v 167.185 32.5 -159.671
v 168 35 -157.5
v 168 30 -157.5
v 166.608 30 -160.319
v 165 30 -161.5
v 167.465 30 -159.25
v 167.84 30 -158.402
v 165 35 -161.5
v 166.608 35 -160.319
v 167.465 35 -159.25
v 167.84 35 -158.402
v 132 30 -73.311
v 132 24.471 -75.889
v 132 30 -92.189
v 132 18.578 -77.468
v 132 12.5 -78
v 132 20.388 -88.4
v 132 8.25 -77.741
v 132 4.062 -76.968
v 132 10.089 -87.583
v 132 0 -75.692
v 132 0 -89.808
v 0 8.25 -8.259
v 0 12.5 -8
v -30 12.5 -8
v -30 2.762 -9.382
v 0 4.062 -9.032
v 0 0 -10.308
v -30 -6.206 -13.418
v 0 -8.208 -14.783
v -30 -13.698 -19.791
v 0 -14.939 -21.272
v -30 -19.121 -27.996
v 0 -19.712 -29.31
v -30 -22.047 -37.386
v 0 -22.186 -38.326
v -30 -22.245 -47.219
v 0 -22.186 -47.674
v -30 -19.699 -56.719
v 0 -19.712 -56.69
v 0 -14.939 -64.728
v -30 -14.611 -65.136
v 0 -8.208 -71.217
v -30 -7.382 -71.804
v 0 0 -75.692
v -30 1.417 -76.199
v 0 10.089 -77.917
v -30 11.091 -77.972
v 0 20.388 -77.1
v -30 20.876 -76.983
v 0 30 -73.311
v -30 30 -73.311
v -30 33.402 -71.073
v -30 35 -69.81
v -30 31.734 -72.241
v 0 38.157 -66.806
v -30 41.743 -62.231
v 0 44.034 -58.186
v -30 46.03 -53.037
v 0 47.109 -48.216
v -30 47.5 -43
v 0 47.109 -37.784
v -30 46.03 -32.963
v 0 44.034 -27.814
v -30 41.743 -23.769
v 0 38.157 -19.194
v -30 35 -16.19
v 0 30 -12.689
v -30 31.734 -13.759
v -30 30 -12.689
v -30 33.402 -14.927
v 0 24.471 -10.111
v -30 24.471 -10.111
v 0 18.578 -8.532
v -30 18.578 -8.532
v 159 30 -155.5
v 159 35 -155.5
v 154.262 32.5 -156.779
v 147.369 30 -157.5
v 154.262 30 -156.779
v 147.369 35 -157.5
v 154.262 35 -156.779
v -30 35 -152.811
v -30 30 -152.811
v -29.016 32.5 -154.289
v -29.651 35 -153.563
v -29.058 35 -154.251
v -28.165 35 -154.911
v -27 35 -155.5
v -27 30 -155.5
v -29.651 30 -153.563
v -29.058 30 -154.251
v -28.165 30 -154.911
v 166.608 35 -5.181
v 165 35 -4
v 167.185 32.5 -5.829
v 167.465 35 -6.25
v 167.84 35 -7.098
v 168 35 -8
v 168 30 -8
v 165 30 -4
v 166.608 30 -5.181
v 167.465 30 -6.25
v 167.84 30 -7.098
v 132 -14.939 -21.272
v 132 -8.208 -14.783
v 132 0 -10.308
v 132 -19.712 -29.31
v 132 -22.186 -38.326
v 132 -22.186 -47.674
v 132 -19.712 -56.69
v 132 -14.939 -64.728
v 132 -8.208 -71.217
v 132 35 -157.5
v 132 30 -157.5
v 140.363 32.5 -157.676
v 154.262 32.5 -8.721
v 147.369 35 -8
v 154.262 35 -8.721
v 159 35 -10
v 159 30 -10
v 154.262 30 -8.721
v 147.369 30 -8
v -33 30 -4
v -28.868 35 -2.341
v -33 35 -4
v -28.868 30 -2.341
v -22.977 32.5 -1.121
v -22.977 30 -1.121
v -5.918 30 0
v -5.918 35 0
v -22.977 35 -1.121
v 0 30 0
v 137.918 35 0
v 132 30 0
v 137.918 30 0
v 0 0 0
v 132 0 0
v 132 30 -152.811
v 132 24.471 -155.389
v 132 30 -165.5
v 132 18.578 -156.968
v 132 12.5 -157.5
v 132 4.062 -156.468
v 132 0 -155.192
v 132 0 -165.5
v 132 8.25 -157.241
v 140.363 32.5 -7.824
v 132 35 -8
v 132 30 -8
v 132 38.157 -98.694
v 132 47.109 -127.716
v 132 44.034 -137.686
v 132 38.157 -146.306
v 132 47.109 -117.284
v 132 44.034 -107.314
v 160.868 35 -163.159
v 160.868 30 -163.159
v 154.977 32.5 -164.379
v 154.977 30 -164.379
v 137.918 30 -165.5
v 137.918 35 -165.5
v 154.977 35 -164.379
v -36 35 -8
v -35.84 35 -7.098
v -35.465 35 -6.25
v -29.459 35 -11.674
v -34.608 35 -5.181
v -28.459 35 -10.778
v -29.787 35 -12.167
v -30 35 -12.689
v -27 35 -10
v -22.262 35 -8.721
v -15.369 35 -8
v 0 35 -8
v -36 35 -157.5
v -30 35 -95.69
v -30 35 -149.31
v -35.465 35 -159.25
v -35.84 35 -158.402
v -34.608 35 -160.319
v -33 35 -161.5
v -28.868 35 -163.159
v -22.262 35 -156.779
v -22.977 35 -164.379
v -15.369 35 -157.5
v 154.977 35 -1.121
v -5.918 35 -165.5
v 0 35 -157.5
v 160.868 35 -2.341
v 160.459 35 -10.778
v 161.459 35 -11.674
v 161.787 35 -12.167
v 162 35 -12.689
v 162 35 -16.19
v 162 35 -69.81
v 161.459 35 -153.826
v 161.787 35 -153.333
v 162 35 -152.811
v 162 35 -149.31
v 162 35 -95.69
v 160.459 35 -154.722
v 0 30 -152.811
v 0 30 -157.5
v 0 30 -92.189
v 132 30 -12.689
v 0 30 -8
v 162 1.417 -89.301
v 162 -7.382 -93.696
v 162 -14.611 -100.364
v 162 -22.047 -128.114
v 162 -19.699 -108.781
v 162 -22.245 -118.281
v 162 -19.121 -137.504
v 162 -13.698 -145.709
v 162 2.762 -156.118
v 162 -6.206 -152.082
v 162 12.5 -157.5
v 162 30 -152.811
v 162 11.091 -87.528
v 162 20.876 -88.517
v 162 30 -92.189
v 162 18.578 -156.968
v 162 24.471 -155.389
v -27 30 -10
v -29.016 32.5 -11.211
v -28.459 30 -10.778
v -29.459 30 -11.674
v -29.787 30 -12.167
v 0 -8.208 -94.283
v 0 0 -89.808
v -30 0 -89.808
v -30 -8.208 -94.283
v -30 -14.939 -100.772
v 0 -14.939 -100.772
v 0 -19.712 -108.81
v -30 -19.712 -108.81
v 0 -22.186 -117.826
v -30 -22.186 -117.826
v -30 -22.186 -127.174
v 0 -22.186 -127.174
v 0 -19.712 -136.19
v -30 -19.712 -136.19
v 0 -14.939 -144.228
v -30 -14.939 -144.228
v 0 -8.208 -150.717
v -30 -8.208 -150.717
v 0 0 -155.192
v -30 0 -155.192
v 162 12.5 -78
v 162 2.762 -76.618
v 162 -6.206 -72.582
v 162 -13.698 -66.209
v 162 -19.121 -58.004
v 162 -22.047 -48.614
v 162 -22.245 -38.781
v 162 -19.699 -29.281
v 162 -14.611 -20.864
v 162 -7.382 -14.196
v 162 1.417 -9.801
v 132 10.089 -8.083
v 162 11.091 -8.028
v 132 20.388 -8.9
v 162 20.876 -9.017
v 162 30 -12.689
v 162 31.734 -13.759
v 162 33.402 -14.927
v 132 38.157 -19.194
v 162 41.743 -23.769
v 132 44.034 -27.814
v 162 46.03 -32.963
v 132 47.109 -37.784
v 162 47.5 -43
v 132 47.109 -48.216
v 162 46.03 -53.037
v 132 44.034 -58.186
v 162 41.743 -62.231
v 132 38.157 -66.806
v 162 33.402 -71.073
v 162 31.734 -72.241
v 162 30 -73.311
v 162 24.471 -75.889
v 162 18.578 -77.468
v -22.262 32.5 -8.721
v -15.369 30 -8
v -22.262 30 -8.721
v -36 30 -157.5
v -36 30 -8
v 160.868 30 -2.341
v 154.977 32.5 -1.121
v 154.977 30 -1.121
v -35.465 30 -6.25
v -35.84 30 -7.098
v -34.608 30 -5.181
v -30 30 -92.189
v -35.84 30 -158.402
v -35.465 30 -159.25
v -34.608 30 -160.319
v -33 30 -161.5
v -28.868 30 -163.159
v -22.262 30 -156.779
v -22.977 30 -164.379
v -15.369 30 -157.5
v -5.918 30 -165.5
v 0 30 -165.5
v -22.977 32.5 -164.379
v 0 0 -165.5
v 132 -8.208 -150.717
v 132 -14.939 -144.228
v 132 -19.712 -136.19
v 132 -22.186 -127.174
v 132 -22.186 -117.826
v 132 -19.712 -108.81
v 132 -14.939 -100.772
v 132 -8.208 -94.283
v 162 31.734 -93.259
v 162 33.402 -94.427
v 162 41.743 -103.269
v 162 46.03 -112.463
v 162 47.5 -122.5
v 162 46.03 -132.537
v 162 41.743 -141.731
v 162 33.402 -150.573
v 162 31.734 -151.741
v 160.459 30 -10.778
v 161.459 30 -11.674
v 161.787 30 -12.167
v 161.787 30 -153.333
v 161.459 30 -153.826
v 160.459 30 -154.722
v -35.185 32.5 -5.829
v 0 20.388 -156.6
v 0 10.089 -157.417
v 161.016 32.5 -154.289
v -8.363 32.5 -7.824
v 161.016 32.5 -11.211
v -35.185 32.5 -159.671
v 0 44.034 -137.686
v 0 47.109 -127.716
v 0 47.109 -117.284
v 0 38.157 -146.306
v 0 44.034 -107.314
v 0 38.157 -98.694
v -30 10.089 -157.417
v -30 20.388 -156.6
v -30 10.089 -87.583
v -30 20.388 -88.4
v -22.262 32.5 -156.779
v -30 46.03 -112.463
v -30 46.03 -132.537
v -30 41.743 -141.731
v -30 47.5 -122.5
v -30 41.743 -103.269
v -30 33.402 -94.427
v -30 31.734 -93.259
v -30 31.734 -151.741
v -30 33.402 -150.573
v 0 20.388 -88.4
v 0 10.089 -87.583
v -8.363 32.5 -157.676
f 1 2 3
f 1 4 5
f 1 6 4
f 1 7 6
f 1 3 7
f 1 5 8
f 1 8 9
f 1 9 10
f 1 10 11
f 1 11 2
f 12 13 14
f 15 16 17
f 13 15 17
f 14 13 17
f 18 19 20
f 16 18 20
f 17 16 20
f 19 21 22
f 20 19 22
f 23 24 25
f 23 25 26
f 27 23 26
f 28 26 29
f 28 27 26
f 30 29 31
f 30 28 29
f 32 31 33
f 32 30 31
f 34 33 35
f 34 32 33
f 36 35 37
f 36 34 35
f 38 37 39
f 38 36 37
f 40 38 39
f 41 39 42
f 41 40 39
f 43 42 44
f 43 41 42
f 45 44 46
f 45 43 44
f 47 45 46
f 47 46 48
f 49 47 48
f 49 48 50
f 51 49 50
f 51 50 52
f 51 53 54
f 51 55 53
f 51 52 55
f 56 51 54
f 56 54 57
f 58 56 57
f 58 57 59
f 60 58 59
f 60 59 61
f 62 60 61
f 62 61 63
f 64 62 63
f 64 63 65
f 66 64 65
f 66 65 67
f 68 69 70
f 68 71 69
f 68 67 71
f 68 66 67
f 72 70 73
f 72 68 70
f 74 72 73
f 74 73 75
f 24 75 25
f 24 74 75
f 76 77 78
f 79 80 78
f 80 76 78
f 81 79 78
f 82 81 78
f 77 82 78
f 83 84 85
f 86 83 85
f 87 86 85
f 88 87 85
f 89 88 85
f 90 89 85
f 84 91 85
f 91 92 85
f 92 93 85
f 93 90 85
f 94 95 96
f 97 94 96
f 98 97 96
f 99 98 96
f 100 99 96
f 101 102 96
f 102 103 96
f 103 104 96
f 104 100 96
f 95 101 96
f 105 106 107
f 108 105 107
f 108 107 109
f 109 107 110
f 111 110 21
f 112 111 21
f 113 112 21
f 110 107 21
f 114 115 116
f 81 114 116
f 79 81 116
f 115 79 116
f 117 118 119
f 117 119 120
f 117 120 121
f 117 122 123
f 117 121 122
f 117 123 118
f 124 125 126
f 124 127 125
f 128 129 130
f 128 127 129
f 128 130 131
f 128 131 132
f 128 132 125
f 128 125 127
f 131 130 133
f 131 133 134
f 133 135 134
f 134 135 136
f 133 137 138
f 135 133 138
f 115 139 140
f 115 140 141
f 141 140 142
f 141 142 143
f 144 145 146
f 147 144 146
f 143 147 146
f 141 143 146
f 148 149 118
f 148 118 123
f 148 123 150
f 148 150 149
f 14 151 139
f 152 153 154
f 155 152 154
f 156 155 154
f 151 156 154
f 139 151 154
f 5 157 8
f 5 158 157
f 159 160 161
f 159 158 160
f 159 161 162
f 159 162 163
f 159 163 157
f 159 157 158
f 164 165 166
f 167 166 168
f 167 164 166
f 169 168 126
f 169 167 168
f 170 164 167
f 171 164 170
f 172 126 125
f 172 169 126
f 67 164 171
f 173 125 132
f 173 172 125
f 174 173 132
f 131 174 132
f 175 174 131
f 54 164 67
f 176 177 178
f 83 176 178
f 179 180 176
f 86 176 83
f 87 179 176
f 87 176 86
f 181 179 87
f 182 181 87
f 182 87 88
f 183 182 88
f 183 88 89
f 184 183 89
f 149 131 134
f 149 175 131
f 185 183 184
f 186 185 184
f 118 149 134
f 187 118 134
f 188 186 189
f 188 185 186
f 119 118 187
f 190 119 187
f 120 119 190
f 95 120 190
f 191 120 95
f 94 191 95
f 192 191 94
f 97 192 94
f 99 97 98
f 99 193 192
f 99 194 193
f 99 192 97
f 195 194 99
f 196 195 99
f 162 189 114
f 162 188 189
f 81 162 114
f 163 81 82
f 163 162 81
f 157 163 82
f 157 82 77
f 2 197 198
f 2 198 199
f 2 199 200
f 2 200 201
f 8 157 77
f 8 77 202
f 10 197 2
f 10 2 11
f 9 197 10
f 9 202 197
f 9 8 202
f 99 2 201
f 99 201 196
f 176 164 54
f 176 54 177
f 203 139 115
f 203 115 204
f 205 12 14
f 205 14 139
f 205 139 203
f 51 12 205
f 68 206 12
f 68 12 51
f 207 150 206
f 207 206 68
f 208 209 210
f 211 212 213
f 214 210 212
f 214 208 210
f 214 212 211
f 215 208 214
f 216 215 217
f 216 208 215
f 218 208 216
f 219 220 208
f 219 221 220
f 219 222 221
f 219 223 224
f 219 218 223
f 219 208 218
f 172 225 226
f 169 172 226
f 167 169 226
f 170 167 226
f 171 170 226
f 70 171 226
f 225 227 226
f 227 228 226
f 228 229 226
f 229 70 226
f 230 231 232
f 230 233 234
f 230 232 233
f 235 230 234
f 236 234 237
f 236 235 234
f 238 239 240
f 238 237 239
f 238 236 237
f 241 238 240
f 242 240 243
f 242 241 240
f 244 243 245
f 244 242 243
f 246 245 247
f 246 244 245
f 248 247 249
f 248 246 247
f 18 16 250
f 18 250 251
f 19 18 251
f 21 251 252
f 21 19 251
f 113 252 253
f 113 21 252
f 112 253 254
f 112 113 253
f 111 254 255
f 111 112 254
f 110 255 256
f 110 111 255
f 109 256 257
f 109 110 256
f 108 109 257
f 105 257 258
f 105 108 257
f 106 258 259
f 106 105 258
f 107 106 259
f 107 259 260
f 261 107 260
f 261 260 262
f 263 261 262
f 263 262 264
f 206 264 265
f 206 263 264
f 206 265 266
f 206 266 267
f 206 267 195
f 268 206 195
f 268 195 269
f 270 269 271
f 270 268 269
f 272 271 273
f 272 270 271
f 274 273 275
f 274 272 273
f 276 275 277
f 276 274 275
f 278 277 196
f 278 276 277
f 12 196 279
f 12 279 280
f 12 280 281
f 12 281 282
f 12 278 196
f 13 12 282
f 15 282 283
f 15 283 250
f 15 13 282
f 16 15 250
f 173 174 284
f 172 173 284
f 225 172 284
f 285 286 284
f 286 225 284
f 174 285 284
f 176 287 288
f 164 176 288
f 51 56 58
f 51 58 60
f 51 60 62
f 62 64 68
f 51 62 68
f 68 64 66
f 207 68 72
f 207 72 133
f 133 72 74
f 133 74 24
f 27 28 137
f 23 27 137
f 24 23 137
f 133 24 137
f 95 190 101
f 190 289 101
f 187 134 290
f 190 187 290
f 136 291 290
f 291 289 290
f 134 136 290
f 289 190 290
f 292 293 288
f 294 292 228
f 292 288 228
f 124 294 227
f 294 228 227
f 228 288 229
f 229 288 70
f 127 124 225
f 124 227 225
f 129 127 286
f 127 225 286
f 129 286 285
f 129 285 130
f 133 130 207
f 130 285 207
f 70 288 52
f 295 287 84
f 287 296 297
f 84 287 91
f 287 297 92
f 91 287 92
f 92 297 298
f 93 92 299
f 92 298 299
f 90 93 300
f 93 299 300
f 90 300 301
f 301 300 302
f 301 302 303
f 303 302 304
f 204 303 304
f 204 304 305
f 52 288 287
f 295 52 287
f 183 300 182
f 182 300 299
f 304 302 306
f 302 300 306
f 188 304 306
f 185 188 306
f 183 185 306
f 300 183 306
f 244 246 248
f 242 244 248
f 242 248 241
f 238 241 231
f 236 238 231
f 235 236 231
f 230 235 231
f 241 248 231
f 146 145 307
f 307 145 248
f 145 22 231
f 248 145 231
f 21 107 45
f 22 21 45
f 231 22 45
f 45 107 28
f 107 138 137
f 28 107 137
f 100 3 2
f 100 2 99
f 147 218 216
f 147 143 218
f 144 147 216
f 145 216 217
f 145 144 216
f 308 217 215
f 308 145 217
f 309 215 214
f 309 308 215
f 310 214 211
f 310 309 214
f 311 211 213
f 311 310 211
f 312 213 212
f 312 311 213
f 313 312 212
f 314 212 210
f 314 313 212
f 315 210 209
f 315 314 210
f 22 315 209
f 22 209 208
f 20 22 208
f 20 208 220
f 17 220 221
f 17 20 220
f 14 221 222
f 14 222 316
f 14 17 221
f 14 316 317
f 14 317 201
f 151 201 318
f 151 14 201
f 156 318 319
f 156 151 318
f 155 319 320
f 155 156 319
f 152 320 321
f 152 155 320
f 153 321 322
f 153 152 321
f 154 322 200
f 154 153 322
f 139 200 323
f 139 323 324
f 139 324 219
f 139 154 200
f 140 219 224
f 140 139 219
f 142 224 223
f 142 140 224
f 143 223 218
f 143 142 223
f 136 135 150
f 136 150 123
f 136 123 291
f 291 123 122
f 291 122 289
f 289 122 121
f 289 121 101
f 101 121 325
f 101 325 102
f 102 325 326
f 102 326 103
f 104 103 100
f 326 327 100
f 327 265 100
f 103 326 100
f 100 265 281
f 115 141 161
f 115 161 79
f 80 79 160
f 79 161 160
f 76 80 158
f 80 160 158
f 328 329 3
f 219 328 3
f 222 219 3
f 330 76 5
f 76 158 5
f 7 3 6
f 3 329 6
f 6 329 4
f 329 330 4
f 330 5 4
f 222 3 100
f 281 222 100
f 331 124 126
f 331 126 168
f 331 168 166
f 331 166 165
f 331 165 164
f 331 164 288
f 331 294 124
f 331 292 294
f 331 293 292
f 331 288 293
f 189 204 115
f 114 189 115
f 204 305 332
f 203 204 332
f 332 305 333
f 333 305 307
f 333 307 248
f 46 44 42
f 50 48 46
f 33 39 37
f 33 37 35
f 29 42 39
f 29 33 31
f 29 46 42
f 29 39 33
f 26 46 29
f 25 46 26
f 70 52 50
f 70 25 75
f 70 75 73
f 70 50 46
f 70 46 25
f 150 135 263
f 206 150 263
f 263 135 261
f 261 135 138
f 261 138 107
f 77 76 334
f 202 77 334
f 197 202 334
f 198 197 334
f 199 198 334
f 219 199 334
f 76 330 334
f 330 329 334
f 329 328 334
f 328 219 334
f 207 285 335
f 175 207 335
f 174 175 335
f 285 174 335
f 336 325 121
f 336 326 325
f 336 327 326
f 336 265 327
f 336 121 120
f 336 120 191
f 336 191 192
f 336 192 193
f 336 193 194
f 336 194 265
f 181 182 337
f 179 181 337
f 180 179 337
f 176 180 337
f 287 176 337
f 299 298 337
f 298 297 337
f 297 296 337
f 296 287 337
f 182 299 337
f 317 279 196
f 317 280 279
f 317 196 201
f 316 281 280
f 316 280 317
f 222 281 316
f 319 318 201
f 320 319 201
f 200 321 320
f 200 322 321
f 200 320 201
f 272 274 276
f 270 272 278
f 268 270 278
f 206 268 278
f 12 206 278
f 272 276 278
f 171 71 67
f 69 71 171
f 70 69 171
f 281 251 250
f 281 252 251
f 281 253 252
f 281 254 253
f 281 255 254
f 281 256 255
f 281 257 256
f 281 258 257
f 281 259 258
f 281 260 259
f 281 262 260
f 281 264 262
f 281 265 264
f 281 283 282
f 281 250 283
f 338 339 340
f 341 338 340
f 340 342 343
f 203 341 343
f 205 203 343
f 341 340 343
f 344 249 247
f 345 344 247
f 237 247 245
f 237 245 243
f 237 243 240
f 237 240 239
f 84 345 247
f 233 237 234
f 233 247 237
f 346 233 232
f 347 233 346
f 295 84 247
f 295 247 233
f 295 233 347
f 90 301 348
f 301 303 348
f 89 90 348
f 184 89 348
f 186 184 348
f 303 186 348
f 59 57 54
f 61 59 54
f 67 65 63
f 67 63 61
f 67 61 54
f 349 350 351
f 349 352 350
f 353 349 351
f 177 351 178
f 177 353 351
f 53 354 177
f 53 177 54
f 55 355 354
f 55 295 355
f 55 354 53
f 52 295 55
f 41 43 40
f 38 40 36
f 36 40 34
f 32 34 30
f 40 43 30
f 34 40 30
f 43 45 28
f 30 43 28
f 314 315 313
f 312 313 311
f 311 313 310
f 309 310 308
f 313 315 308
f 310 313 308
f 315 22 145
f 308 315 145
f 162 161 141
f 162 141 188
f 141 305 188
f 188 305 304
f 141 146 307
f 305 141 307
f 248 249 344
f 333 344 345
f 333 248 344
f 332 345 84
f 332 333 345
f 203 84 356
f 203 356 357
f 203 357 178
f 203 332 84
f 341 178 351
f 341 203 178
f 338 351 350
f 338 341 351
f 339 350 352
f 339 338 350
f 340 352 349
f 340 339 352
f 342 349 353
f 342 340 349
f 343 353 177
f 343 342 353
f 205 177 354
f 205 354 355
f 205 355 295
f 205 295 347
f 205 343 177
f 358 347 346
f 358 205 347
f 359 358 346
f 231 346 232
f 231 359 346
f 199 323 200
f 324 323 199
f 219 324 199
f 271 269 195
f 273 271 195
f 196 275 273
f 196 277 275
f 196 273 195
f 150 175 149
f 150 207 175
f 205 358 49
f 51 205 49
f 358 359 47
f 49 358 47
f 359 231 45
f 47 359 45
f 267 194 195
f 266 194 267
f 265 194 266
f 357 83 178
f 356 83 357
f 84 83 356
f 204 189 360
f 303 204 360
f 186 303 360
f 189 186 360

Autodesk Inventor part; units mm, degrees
ref_plane "YZ Plane" through (0, 0, 0) normal (1, 0, 0) x (0, 1, 0)
ref_plane "XZ Plane" through (0, 0, 0) normal (0, 1, 0) x (-1, 0, 0)
ref_plane "XY Plane" through (0, 0, 0) normal (0, 0, 1) x (1, 0, 0)
sketch "Эскиз1" plane through (0, 0, 0) normal (0, 1, 0) x (-1, 0, 0)
  line L0 (0, 0) -> (-132, 0)
  line L1 (-132, 0) -> (-132, -165.5)
  line L2 (-132, -165.5) -> (0, -165.5)
  line L3 (0, -165.5) -> (0, 0)
  line L4 (0, 0) -> (-132, 0)
  line L5 (-132, 0) -> (-132, -8)
  line L6 (-132, -8) -> (0, -8)
  line L7 (0, -8) -> (0, 0)
  line L8 (0, -165.5) -> (-132, -165.5)
  line L9 (-132, -165.5) -> (-132, -157.5)
  line L10 (-132, -157.5) -> (0, -157.5)
  line L11 (0, -157.5) -> (0, -165.5)
  line L12 (0, 0) -> (0, -43)
  line L13 (0, -43) -> (0, -8)
  line L14 (0, -8) -> (30, -8)
  line L15 (30, -8) -> (30, -78)
  line L16 (30, -78) -> (0, -78)
  line L17 (0, -78) -> (0, -8)
  line L18 (0, -157.5) -> (30, -157.5)
  line L19 (30, -157.5) -> (30, -87.5)
  line L20 (30, -87.5) -> (0, -87.5)
  line L21 (0, -87.5) -> (0, -157.5)
  line L22 (-132, -8) -> (-162, -8)
  line L23 (-162, -8) -> (-162, -78)
  line L24 (-162, -78) -> (-132, -78)
  line L25 (-132, -78) -> (-132, -8)
  line L26 (-132, -157.5) -> (-162, -157.5)
  line L27 (-162, -157.5) -> (-162, -87.5)
  line L28 (-162, -87.5) -> (-132, -87.5)
  line L29 (-132, -87.5) -> (-132, -157.5)
  dimension "d0" = 132
  dimension "d1" = 165.5
  dimension "d2" = 8
  dimension "d3" = 8
  dimension "d4" = 43
  dimension "d5" = 35
  dimension "d6" = 30
  dimension "d7" = 70
  dimension "d8" = 30
  dimension "d9" = 70
  dimension "d10" = 30
  dimension "d11" = 70
  dimension "d12" = 30
  dimension "d13" = 70
extrude "Выдавливание1" add sketch "Эскиз1" along normal blind 30 contours L3 L6 L1 L0 | L3 L10 L1 L6 | L10 L3 L2 L1
sketch "Эскиз2" plane through (132, 0, 0) normal (1, 0, 0) x (0, 0, -1)
  line L0 (0, 0) -> (0, 30) projected
  line L1 (165.5, 0) -> (165.5, 30) projected
  line L2 (165.5, 0) -> (0, 0) projected
  line L3 (0, 0) -> (43, 0)
  line L4 (43, 0) -> (43, 4.5763)
  line L5 (43, 4.5763) -> (43, 30)
  line L6 (43, 0) -> (43, 12.5)
  line L7 (165.5, 0) -> (122.5, 0)
  line L8 (122.5, 0) -> (122.5, 12.5)
  line L9 (122.5, 12.5) -> (43, 12.5)
  circle A0 centre (43, 12.5) radius 35
  circle A1 centre (122.5, 12.5) radius 35
  dimension "d24" = 43
  dimension "d25" = 12.5
  dimension "d26" = 43
  dimension "d27" = 70
  dimension "d28" = 70
extrude "Выдавливание2" add sketch "Эскиз2" along normal blind 30 contours A1 L2 | L2 L8 L9 A1 | L2 A1 L9 L8 | A0 L2 | L2 L4 L5 L9 A0 | L2 A0 L9 L5 L4
sketch "Эскиз3" plane through (0, 0, -165.5) normal (-1, 0, 0) x (0, 0, 1)
  circle A0 centre (122.5, 12.5) radius 35 projected
  circle A1 centre (122.5, 12.5) radius 35
  arc A2 (10.3083, 0) -> (75.6917, 0) centre (43, 12.5) ccw projected
  circle A3 centre (43, 12.5) radius 35
  point P0 (165.5, 0)
  point P1 (122.5, 15)
  point P2 (43, 15)
  point P3 (75.6917, 0)
extrude "Выдавливание3" add sketch "Эскиз3" along normal blind 30
sketch "Эскиз4" plane through (0, 30, 0) normal (0, 1, 0) x (1, 0, 0)
  line L0 (-30, 78) -> (-30, 8) projected
  line L1 (-36, 8) -> (-36, 0)
  line L2 (132, 165.5) -> (0, 165.5) projected
  line L3 (-36, 0) -> (0, 0)
  line L4 (0, 0) -> (0, 165.5)
  line L5 (0, 165.5) -> (-36, 165.5)
  line L6 (-36, 165.5) -> (-36, 0)
  line L7 (132, 152.8109) -> (132, 165.5) projected
  line L8 (132, 165.5) -> (168, 165.5)
  line L9 (168, 165.5) -> (168, 0)
  line L10 (168, 0) -> (132, 0)
  line L11 (132, 0) -> (132, 165.5)
  line L12 (0, 8) -> (-30, 8) projected
  line L13 (-30, 157.5) -> (-30, 87.5) projected
  line L14 (0, 8) -> (-30, 8)
  line L15 (-30, 8) -> (-30, 157.5)
  line L16 (-30, 157.5) -> (0, 157.5)
  line L17 (0, 157.5) -> (0, 8)
  line L18 (162, 8) -> (162, 78) projected
  line L19 (132, 157.5) -> (162, 157.5)
  line L20 (162, 157.5) -> (162, 8)
  line L21 (162, 8) -> (132, 8)
  line L22 (132, 8) -> (132, 157.5)
  line L23 (168, 0) -> (-36, 0)
  line L24 (-36, 0) -> (-36, 165.5)
  line L25 (-36, 165.5) -> (168, 165.5)
  line L26 (168, 165.5) -> (168, 0)
  line L27 (0, 157.5) -> (132, 157.5)
  line L28 (132, 157.5) -> (132, 165.5)
  line L29 (132, 165.5) -> (0, 165.5)
  line L30 (0, 165.5) -> (0, 157.5)
  line L31 (0, 8) -> (0, 12.6891) projected
  line L32 (132, 0) -> (0, 0)
  line L33 (0, 0) -> (0, 8)
  line L34 (0, 8) -> (132, 8)
  line L35 (132, 8) -> (132, 0)
  line L36 (168, 165.5) -> (165, 165.5)
  line L37 (165, 165.5) -> (165, 161.5)
  line L38 (165, 161.5) -> (168, 161.5)
  line L39 (168, 161.5) -> (168, 165.5)
  line L40 (168, 0) -> (165, 0)
  line L41 (165, 0) -> (165, 4)
  line L42 (165, 4) -> (168, 4)
  line L43 (168, 4) -> (168, 0)
  line L44 (-36, 0) -> (-33, 0)
  line L45 (-33, 0) -> (-33, 4)
  line L46 (-33, 4) -> (-36, 4)
  line L47 (-36, 4) -> (-36, 0)
  line L48 (-36, 165.5) -> (-33, 165.5)
  line L49 (-33, 165.5) -> (-33, 161.5)
  line L50 (-33, 161.5) -> (-36, 161.5)
  line L51 (-36, 161.5) -> (-36, 165.5)
  line L52 (0, 165.5) -> (0, 155.1917) projected
  spline S0 degree 2 poles (0, 165.5) (-35.5316, 165.8812) (-36, 157.5) knots 0 0 0 1 1 1
  spline S1 degree 2 poles (132, 165.5) (167.5316, 165.8812) (168, 157.5) knots 0 0 0 1 1 1
  spline S2 degree 2 poles (132, 0) (167.5316, -0.3812) (168, 8) knots 0 0 0 1 1 1
  line L53 (0, 0) -> (132, 0) projected
  spline S3 degree 2 poles (0, 0) (-35.5316, -0.3812) (-36, 8) knots 0 0 0 1 1 1
  line L54 (-30, 8) -> (-27, 8)
  line L55 (-27, 8) -> (-27, 10)
  line L56 (-27, 10) -> (-30, 10)
  line L57 (-30, 10) -> (-30, 8)
  spline S4 degree 2 poles (0, 8) (-28.3192, 6.9002) (-30, 12.6891) knots 0 0 0 1 1 1
  line L58 (162, 8) -> (159, 8)
  line L59 (159, 8) -> (159, 10)
  line L60 (159, 10) -> (162, 10)
  line L61 (162, 10) -> (162, 8)
  line L62 (162, 157.5) -> (159, 157.5)
  line L63 (159, 157.5) -> (159, 155.5)
  line L64 (159, 155.5) -> (162, 155.5)
  line L65 (162, 155.5) -> (162, 157.5)
  line L66 (-30, 157.5) -> (-27, 157.5)
  line L67 (-27, 157.5) -> (-27, 155.5)
  line L68 (-27, 155.5) -> (-30, 155.5)
  line L69 (-30, 155.5) -> (-30, 157.5)
  spline S5 degree 2 poles (-30, 152.8109) (-28.3192, 158.5998) (0, 157.5) knots 0 0 0 1 1 1
  line L70 (162, 87.5) -> (162, 157.5) projected
  spline S6 degree 2 poles (132, 157.5) (160.3192, 158.5998) (162, 152.8109) knots 0 0 0 1 1 1
  spline S7 degree 2 poles (132, 8) (160.3192, 6.9002) (162, 12.6891) knots 0 0 0 1 1 1
  point P0 (0, 10.3083)
  point P1 (162, 152.8109)
  point P2 (137.9176, 0)
  point P3 (168, 8)
  point P4 (168, 157.5)
  point P5 (137.9176, 165.5)
  point P6 (-5.9176, 165.5)
  point P7 (-36, 157.5)
  point P8 (-5.9176, 0)
  point P9 (-30, 12.6891)
  point P10 (-30, 152.8109)
  dimension "d30" = 36
  dimension "d31" = 3
  dimension "d32" = 3
  dimension "d33" = 3
  dimension "d34" = 2
  dimension "d35" = 3
  dimension "d36" = 2
  dimension "d37" = 3
  dimension "d38" = 2
extrude "Выдавливание4" add sketch "Эскиз4" along normal blind 5 contours L0 L12 S4 L4 L3 S3 L6 S0 L5 S5 L16 L13 L15 | S4 L56 L0 | L56 L55 L12 L0 | S4 L12 L55 | L13 L68 S5 | L13 L16 L67 L68 | L67 L16 S5 | L34 L11 L23 L4 | S7 L21 L18 L20 L19 S6 L7 L8 S1 L9 S2 L10 L11 | L4 L2 L7 L27 | S7 L59 L21 | L59 L60 L18 L21 | S7 L18 L60 | L19 L63 S6 | L19 L20 L64 L63 | L64 L20 S6
sketch "Эскиз6" plane through (0, 30, 0) normal (0, 1, 0) x (1, 0, 0)
  line L0 (168, 8) -> (168, 157.5) projected
  line L1 (-36, 157.5) -> (-36, 8) projected
  line L2 (162, 16.1905) -> (162, 69.8095) projected
  line L3 (-30, 69.8095) -> (-30, 16.1905) projected
  line L4 (132, 12.6891) -> (132, 73.3109) projected
  line L5 (0, 73.3109) -> (0, 12.6891) projected
  line L6 (187.3576, 0) -> (377.3576, 0)
  line L7 (377.3576, 0) -> (377.3576, 165.5)
  line L8 (377.3576, 165.5) -> (187.3576, 165.5)
  line L9 (187.3576, 165.5) -> (187.3576, 0)
  point P0 (0, 0)
  dimension "d41" = 204
  dimension "d42" = 192
  dimension "d43" = 132
  dimension "d44" = 190
  dimension "d45" = 165.5
